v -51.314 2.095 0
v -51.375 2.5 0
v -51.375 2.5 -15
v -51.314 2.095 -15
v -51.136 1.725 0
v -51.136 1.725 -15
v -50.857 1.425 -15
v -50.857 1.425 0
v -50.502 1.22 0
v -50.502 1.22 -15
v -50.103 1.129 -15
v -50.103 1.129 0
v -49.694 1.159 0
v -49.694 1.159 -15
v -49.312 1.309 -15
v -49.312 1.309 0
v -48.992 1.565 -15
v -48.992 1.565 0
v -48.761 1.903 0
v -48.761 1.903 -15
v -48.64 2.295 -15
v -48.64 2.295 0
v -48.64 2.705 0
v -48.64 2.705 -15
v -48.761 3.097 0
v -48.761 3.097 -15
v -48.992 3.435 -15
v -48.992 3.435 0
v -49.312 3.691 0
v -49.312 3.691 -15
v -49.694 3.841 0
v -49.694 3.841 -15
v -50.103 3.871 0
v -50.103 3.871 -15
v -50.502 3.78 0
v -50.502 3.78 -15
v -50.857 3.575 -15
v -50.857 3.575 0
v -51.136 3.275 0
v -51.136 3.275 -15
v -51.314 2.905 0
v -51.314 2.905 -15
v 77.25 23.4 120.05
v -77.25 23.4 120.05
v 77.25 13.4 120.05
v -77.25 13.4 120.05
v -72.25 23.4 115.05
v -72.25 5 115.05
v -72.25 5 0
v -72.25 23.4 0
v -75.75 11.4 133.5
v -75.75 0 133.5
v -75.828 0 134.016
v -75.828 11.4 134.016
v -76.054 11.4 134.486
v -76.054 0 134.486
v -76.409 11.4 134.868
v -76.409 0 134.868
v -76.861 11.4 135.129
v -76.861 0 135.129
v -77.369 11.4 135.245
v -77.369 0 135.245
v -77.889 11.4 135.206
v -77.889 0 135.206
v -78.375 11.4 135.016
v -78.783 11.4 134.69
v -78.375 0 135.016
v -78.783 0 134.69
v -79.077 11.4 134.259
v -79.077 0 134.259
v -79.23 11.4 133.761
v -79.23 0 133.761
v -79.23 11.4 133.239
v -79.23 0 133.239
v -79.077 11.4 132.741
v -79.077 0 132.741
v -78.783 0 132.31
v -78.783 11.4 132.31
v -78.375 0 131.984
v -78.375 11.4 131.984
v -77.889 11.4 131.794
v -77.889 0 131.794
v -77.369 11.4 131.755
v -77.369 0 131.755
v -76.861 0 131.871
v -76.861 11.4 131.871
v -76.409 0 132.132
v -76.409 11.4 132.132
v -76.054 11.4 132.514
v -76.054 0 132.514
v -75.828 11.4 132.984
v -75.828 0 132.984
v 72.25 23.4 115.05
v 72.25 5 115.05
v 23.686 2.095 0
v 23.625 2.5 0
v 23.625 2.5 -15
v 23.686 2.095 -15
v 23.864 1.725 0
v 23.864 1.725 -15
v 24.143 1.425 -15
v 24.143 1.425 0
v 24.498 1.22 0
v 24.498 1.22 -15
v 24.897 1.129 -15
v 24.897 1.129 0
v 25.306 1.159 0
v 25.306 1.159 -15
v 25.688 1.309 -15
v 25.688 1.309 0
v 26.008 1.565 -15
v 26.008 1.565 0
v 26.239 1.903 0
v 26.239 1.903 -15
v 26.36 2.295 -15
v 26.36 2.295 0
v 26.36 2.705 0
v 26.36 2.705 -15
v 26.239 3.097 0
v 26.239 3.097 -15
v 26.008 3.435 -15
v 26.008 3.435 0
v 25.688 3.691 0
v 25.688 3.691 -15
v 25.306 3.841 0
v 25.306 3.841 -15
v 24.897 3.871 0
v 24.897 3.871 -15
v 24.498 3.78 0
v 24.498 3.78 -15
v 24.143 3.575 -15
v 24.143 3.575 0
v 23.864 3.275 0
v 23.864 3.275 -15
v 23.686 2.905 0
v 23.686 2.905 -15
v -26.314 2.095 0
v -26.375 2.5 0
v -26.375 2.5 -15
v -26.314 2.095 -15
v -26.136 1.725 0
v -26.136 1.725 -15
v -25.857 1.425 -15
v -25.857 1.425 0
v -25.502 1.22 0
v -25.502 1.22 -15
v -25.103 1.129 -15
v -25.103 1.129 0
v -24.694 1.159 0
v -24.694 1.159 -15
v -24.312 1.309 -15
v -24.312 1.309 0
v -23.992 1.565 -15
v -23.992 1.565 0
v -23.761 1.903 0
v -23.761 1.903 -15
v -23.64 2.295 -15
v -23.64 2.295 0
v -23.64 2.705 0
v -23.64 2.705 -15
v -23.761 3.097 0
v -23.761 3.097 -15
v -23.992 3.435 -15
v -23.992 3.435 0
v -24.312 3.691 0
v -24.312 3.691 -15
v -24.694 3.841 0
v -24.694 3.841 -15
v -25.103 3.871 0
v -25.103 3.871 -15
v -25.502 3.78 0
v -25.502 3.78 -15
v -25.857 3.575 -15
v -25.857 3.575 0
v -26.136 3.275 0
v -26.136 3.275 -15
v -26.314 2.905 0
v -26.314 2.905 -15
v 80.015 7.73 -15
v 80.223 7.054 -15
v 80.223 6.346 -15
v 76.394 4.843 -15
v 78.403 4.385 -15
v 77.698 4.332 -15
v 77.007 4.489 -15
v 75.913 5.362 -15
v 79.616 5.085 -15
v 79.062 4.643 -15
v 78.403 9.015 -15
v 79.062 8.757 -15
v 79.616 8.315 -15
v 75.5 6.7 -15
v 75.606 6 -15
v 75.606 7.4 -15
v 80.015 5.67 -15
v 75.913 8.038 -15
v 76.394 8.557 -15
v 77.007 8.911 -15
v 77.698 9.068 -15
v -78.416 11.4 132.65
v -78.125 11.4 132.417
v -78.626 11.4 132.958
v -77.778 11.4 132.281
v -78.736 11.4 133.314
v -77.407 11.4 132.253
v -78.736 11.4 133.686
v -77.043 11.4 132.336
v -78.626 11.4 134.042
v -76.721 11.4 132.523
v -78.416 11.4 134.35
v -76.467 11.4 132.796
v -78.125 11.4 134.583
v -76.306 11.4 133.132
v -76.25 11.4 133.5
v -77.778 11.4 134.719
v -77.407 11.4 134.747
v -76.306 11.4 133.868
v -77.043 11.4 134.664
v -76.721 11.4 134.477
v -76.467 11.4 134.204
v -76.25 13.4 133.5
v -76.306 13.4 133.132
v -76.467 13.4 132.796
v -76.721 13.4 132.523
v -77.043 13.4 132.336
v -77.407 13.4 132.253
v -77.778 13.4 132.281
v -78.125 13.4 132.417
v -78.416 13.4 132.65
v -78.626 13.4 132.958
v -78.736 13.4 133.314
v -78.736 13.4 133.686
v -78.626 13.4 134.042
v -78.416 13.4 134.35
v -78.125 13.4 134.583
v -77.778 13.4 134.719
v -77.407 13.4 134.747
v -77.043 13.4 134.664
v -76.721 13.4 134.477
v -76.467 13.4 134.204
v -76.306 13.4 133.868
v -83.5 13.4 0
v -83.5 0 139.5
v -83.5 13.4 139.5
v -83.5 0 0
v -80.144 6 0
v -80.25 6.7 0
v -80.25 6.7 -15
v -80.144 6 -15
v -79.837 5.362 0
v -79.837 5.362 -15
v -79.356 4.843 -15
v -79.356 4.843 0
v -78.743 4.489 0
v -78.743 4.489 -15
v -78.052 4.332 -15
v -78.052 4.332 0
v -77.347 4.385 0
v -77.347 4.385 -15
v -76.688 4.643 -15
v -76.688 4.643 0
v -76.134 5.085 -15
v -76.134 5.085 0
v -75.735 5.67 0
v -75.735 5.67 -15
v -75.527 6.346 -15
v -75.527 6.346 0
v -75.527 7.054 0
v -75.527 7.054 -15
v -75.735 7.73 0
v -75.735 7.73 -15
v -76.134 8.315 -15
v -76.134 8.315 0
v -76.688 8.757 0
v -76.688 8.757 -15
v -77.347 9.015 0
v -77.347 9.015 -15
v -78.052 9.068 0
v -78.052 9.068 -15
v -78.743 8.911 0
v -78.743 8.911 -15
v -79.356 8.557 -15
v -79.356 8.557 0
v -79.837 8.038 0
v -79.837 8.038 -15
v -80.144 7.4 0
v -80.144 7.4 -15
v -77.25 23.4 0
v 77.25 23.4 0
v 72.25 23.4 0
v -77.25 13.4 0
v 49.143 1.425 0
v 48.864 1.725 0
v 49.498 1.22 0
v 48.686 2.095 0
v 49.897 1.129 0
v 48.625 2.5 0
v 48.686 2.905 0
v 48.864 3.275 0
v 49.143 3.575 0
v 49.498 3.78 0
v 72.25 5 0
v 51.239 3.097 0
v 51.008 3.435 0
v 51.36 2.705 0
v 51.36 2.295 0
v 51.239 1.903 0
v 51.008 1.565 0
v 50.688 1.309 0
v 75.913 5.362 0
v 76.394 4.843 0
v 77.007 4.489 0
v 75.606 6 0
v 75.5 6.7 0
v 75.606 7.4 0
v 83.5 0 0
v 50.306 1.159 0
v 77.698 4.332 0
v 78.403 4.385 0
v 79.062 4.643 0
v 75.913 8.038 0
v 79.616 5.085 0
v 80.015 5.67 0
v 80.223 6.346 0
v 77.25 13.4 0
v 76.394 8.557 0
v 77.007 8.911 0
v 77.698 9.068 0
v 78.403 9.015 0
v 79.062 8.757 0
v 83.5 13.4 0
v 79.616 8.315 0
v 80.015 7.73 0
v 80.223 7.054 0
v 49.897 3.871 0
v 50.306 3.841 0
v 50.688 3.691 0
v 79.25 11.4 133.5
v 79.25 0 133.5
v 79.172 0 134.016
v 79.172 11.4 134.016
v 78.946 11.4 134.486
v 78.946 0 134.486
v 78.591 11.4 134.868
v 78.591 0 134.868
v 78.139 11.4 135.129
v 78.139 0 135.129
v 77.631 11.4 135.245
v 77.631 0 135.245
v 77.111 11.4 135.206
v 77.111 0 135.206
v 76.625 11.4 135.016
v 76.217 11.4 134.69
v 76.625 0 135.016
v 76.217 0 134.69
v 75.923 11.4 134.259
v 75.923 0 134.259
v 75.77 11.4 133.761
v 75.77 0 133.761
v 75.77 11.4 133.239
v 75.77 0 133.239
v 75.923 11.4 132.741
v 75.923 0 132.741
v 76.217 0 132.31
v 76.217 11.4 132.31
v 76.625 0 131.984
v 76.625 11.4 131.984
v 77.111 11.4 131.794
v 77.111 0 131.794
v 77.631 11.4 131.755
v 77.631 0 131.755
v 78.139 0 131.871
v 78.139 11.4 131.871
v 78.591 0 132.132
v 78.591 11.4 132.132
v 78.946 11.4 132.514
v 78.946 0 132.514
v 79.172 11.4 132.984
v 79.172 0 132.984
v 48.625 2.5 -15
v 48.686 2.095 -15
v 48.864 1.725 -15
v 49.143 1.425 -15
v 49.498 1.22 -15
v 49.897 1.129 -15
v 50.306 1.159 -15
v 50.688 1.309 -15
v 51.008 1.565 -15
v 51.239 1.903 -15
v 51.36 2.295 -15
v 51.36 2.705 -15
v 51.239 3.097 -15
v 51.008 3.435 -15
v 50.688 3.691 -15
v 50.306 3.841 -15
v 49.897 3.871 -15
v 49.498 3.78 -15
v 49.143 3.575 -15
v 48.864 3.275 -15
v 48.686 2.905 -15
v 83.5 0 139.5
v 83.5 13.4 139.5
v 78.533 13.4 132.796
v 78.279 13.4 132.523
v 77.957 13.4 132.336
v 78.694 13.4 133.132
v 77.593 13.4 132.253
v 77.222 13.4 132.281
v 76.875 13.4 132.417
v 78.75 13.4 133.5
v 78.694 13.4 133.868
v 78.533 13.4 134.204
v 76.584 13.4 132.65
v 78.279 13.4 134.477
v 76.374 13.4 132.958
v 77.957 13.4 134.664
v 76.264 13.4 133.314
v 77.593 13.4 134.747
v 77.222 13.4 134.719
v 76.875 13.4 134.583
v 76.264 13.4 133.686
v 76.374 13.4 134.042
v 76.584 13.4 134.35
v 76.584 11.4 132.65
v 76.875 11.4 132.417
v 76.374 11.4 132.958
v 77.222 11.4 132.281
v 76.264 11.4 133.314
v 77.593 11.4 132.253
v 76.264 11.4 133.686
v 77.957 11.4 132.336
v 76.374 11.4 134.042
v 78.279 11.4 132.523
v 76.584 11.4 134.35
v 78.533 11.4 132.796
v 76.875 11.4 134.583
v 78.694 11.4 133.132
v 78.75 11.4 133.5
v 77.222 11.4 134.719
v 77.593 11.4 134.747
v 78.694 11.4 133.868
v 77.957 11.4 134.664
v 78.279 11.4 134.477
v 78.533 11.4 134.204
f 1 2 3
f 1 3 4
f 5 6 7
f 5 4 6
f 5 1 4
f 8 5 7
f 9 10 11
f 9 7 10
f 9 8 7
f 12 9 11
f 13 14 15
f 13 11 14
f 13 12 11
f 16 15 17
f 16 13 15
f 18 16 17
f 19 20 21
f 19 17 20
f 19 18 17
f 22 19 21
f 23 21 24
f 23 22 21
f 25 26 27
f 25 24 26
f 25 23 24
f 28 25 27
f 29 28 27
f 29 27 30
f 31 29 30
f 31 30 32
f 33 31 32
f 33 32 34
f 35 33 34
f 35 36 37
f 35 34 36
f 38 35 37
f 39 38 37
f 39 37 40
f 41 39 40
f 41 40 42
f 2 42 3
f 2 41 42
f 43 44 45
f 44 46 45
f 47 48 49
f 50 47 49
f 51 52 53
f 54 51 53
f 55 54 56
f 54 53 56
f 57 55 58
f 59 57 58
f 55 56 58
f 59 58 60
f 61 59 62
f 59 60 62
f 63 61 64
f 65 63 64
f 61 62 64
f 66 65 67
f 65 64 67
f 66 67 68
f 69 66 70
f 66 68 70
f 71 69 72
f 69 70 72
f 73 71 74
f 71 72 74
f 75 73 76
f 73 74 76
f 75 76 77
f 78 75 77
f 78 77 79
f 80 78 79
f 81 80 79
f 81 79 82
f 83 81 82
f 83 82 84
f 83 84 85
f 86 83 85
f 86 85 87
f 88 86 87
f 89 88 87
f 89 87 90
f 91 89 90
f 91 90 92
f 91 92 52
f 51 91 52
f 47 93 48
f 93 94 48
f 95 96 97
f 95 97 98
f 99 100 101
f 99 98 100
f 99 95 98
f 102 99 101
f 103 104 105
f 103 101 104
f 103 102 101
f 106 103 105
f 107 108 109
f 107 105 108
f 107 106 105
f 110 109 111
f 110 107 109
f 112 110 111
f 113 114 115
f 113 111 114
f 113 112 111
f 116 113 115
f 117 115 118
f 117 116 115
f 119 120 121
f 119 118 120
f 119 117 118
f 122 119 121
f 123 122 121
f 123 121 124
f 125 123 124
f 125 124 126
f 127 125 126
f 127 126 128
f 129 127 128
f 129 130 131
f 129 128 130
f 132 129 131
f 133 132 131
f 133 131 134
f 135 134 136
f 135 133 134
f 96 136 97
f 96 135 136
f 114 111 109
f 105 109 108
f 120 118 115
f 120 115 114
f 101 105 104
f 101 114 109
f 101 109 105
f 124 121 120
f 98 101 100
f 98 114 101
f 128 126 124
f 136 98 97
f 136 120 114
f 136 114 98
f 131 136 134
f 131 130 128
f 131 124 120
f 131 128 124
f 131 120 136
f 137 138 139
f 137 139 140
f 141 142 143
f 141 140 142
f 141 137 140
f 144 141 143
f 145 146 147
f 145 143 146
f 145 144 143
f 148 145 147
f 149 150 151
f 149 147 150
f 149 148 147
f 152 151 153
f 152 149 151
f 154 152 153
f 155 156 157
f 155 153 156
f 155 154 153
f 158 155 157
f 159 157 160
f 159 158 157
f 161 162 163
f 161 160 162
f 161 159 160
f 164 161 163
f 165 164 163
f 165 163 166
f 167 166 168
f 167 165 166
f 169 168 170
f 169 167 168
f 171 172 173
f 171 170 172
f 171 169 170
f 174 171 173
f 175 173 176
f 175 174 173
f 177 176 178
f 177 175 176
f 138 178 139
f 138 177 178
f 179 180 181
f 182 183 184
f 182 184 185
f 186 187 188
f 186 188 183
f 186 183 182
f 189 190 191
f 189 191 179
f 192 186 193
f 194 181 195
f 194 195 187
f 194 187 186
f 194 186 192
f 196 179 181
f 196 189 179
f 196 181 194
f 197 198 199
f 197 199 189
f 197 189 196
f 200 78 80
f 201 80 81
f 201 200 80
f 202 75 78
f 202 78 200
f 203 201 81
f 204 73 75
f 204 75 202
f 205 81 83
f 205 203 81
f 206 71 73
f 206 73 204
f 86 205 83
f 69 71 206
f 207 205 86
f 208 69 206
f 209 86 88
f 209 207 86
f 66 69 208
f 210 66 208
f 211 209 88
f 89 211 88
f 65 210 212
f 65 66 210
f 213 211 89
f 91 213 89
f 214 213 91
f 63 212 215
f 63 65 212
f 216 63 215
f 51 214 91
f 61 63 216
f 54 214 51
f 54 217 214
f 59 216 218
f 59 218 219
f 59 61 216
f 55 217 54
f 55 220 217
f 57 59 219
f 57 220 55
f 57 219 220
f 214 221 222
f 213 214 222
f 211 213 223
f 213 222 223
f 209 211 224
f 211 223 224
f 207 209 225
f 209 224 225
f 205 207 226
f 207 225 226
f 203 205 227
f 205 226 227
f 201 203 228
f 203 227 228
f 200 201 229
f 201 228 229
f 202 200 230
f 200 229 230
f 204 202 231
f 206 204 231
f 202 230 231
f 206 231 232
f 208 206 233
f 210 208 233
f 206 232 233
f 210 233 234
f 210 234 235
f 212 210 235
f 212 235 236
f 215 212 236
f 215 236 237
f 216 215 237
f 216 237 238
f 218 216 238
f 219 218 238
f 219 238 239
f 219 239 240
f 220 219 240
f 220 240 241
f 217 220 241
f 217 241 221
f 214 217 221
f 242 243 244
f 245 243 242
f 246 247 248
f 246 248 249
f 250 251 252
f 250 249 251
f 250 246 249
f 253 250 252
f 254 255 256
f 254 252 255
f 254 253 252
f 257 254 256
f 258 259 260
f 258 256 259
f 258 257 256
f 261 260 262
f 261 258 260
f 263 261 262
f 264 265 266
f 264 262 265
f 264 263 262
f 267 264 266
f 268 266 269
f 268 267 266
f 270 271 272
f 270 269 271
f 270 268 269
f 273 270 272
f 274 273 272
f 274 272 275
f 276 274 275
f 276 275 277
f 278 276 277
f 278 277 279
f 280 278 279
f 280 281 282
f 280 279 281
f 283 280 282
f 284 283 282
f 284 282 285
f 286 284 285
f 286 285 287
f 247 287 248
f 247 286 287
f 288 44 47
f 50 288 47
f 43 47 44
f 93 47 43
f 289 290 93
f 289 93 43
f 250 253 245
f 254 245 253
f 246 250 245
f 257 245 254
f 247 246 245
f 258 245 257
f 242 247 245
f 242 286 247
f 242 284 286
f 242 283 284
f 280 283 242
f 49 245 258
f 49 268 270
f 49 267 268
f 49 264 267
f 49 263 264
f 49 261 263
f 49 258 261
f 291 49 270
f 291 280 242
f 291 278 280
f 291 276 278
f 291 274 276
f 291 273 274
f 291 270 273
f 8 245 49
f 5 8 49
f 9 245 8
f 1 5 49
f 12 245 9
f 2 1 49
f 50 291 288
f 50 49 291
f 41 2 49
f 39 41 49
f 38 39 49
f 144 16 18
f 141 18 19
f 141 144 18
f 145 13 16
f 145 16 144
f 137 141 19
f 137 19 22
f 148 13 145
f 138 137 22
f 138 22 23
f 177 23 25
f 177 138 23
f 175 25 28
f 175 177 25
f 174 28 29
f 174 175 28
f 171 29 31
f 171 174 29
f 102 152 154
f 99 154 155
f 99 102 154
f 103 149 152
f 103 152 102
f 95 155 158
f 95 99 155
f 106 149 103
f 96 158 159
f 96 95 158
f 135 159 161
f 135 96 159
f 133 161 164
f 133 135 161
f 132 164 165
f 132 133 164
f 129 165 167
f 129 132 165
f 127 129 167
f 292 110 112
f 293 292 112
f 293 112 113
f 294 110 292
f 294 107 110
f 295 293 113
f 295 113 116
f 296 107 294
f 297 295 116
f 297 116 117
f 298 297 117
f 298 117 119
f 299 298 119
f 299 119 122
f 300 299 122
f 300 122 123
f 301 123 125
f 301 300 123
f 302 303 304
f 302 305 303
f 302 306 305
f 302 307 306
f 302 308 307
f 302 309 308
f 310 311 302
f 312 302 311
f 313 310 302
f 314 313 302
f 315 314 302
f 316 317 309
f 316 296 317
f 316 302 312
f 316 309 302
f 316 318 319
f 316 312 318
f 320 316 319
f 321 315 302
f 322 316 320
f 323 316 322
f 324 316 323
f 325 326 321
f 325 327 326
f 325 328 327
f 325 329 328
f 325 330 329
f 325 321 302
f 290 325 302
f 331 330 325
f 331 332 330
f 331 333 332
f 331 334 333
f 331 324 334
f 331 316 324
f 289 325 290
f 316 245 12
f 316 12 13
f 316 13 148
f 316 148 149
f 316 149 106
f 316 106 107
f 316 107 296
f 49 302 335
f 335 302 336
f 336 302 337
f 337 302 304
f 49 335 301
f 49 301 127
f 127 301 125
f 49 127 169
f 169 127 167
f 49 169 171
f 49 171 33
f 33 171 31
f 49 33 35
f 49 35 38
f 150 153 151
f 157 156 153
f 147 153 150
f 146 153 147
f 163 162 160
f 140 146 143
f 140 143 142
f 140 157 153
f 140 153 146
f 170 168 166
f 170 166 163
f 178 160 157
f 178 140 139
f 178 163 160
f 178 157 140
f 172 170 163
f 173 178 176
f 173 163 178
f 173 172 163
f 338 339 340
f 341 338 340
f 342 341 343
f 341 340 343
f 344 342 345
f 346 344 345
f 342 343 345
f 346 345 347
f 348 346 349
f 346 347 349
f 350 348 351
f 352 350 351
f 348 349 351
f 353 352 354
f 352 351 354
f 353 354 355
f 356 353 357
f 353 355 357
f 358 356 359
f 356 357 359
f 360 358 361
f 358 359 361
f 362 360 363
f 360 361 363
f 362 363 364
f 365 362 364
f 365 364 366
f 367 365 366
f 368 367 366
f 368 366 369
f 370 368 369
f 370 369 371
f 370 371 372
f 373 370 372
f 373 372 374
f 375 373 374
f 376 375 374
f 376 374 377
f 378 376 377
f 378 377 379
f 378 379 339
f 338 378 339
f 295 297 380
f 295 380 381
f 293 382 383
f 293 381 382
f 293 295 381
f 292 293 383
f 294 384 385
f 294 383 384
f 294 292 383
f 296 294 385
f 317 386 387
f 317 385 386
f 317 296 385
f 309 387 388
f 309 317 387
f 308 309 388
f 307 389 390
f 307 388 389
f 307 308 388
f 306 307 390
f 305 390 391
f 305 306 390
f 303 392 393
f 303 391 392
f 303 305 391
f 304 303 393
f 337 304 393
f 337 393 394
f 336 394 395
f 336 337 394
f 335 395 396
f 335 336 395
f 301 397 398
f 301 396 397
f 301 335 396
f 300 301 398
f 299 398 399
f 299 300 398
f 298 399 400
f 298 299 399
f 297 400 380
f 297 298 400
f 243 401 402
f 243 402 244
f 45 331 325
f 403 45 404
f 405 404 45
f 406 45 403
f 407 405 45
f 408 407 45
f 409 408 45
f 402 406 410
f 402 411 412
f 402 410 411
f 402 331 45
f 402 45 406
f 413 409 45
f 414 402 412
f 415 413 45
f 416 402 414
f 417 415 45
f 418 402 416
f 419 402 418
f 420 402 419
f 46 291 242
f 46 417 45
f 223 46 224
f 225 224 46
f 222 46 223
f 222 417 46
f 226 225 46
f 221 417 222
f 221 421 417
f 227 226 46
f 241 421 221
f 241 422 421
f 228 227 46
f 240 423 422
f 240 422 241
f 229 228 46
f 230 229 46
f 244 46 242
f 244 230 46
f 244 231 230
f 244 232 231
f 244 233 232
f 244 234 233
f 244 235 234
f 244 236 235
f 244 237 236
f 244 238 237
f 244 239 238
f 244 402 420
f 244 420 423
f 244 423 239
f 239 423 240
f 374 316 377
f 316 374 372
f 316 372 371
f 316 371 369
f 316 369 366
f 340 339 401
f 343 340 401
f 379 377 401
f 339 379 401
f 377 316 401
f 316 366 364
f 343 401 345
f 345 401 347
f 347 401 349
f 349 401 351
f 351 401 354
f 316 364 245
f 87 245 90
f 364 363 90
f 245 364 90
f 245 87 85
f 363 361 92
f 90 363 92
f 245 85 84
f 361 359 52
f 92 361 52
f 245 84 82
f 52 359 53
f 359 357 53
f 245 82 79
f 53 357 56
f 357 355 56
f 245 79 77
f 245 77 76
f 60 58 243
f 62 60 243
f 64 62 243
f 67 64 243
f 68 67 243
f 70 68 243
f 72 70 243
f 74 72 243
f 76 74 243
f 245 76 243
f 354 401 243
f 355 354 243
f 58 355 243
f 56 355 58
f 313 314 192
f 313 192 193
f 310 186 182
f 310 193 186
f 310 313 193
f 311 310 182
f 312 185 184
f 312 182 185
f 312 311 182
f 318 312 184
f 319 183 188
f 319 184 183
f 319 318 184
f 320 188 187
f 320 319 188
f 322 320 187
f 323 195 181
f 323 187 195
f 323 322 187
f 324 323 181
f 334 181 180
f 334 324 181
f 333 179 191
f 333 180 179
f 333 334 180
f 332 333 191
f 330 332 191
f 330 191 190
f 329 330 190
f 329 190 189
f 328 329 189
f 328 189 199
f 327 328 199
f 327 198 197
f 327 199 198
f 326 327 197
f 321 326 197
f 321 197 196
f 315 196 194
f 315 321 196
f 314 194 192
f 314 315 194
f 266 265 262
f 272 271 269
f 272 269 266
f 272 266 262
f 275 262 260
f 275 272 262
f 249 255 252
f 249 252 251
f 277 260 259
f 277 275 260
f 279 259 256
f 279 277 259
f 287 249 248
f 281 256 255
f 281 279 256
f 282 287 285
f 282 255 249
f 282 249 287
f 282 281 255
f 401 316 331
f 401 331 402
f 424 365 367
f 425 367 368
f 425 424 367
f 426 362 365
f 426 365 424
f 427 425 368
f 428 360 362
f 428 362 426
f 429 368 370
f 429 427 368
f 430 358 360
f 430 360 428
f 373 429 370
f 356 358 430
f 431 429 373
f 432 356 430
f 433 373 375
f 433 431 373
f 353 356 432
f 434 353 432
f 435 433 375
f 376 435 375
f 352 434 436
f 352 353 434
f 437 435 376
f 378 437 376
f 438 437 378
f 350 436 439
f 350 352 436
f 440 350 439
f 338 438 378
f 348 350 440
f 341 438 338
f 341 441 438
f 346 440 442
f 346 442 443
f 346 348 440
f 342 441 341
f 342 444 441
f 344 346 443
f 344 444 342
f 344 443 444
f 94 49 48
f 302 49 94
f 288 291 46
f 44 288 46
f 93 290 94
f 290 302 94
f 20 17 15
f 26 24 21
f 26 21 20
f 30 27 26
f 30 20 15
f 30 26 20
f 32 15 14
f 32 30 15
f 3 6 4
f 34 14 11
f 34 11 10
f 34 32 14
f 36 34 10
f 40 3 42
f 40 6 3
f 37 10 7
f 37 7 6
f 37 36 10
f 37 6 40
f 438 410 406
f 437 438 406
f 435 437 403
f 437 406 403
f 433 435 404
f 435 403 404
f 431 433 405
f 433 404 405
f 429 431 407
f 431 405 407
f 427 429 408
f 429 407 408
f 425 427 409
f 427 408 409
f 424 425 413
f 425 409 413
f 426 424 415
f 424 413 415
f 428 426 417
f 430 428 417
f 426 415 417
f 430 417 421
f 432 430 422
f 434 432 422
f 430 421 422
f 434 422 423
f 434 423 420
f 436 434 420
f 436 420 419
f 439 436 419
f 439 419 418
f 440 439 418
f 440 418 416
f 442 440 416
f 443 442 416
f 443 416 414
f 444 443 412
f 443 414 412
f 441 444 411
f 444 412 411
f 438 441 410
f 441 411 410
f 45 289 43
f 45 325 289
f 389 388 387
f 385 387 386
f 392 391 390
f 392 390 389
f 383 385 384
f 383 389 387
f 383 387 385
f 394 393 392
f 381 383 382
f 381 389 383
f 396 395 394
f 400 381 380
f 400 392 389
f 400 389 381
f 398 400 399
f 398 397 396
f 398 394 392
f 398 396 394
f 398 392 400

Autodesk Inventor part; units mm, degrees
ref_plane "YZ Plane" through (0, 0, 0) normal (1, 0, 0) x (0, 1, 0)
ref_plane "XZ Plane" through (0, 0, 0) normal (0, 1, 0) x (-1, 0, 0)
sketch "Sketch1" plane through (0, 0, 0) normal (0, 1, 0) x (-1, 0, 0)
  line L0 (-83.5, 139.5) -> (83.5, 139.5)
  line L1 (83.5, 139.5) -> (83.5, -139.5)
  line L2 (83.5, -139.5) -> (-83.5, -139.5)
  line L3 (-83.5, -139.5) -> (-83.5, 139.5)
  line L4 (-83.5, 139.5) -> (83.5, -139.5) construction
  line L5 (83.5, 139.5) -> (-83.5, -139.5) construction
  point P0 (0, 0)
  dimension "d0" = 167
  dimension "d1" = 279
extrude "Extrusion1" add sketch "Sketch1" along normal blind 13.4
sketch "Sketch2" plane through (0, 13.4, 0) normal (0, 1, 0) x (1, 0, 0)
  line L0 (72.25, -115.05) -> (-72.25, -115.05)
  line L1 (-72.25, -115.05) -> (-72.25, 115.05)
  line L2 (-72.25, 115.05) -> (72.25, 115.05)
  line L3 (72.25, 115.05) -> (72.25, -115.05)
  line L4 (72.25, -115.05) -> (-72.25, 115.05) construction
  line L5 (-72.25, -115.05) -> (72.25, 115.05) construction
  point P0 (0, 0)
  dimension "d4" = 144.5
  dimension "d5" = 230.1
extrude "Extrusion2" cut sketch "Sketch2" against normal blind 8.4
sketch "Sketch4" plane through (0, 13.4, 0) normal (0, 1, 0) x (1, 0, 0)
  circle A0 centre (-77.5, -133.5) radius 1.25
  line L0 (-83.5, 139.5) -> (-83.5, -139.5) projected
  line L1 (-83.5, -139.5) -> (83.5, -139.5) projected
  circle A1 centre (-77.5, 133.5) radius 1.25
  line L2 (83.5, 139.5) -> (-83.5, 139.5) projected
  circle A2 centre (77.5, 133.5) radius 1.25
  line L3 (83.5, -139.5) -> (83.5, 139.5) projected
  circle A3 centre (77.5, -133.5) radius 1.25
  point P0 (0, 0)
  dimension "d16" = 2.5
  dimension "d17" = 6
  dimension "d18" = 6
  dimension "d19" = 2.5
  dimension "d20" = 6
  dimension "d21" = 6
  dimension "d22" = 2.5
  dimension "d23" = 6
  dimension "d24" = 6
  dimension "d25" = 2.5
  dimension "d26" = 6
  dimension "d27" = 6
extrude "Extrusion4" cut sketch "Sketch4" against normal through all contours A0 | A1 | A2 | A3
sketch "Sketch5" plane through (0, 13.4, 0) normal (0, 1, 0) x (1, 0, 0)
  line L0 (-72.25, -115.05) -> (-72.25, 115.05) projected
  line L1 (72.25, -115.05) -> (-72.25, -115.05) projected
  line L2 (-77.25, -120.05) -> (-72.25, -120.05)
  line L3 (-72.25, -120.05) -> (-72.25, 120.05)
  line L4 (-72.25, 120.05) -> (-77.25, 120.05)
  line L5 (-77.25, 120.05) -> (-77.25, -120.05)
  line L6 (72.25, 115.05) -> (72.25, -115.05) projected
  line L7 (77.25, -120.05) -> (72.25, -120.05)
  line L8 (72.25, -120.05) -> (72.25, 120.05)
  line L9 (72.25, 120.05) -> (77.25, 120.05)
  line L10 (77.25, 120.05) -> (77.25, -120.05)
  line L11 (-72.25, 115.05) -> (72.25, 115.05) projected
  line L12 (72.25, 120.05) -> (-72.25, 120.05)
  line L13 (-72.25, 120.05) -> (-72.25, 115.05)
  line L14 (-72.25, 115.05) -> (72.25, 115.05)
  line L15 (72.25, 115.05) -> (72.25, 120.05)
  line L16 (-72.25, -115.05) -> (72.25, -115.05)
  line L17 (72.25, -115.05) -> (72.25, -120.05)
  line L18 (72.25, -120.05) -> (-72.25, -120.05)
  line L19 (-72.25, -120.05) -> (-72.25, -115.05)
  point P0 (0, 0)
  dimension "d30" = 5
  dimension "d31" = 5
  dimension "d32" = 240.1
  dimension "d33" = 5
  dimension "d34" = 5
  dimension "d35" = 240.1
extrude "Extrusion5" add sketch "Sketch5" along normal blind 10 contours L3 L2 L5 L4 L0 | L1 L8 L18 L3 | L3 L12 L8 L11 | L6 L8 L9 L10 L7
sketch "Sketch7" plane through (0, 0, 0) normal (0, -1, 0) x (1, 0, 0)
  circle A0 centre (-77.5, -133.5) radius 1.25 projected
  circle A1 centre (-77.5, -133.5) radius 1.75
  circle A2 centre (-77.5, 133.5) radius 1.25 projected
  circle A3 centre (-77.5, 133.5) radius 1.75
  circle A4 centre (77.5, 133.5) radius 1.25 projected
  circle A5 centre (77.5, 133.5) radius 1.75
  circle A6 centre (77.5, -133.5) radius 1.25 projected
  circle A7 centre (77.5, -133.5) radius 1.75
  point P0 (0, 0)
  dimension "d42" = 3.5
  dimension "d43" = 3.5
  dimension "d44" = 3.5
  dimension "d45" = 3.5
extrude "Extrusion6" cut sketch "Sketch7" against normal blind 11.4 contours A0 | A1 | A2 | A3 | A4 | A5 | A7
sketch "Sketch8" plane through (83.5, 0, 139.5) normal (1, 0, 0) x (0, 0, -1)
  line L0 (139.5, 0) -> (139.5, 13.4)
  line L1 (0, 13.4) -> (279, 13.4) projected
sketch "Sketch9" plane through (0, 13.4, 0) normal (0, 1, 0) x (1, 0, 0)
  line L0 (83.5, -139.5) -> (83.5, 139.5) projected
  line L1 (83.5, 0) -> (77.25, 0)
  line L2 (77.25, 120.05) -> (77.25, -120.05) projected
  point P0 (0, 0)
sketch "Sketch10" plane through (77.25, 13.4, 120.05) normal (1, 0, 0) x (0, 0, -1)
  line L0 (-19.45, 0) -> (259.55, 0) projected
  line L1 (120.05, 0) -> (120.05, 10)
  line L2 (0, 10) -> (240.1, 10) projected
  point P0 (120.05, -13.4)
split_face "Split1"
split_face "Split2"
split_face "Split3"
ref_plane "Work Plane1" through (83.5, 0, -139.5) normal (1, 0, 0) x (0, 0, -1)
sketch "Sketch11" plane through (83.5, 0, -139.5) normal (1, 0, 0) x (0, 0, -1)
  line L0 (0, 0) -> (0, 13.4) projected
  line L1 (-139.5, 5) -> (-139.5, 23.4) projected
  line L2 (0, 0) -> (-139.5, 0)
  line L3 (-139.5, 0) -> (-139.5, 23.4)
  line L4 (-139.5, 23.4) -> (0, 23.4)
  line L5 (0, 23.4) -> (0, 0)
  point P0 (-139.5, 0)
extrude "Extrusion7" cut sketch "Sketch11" against normal blind 167.1625
sketch "Sketch12" plane through (83.5, 0, 0) normal (0, 0, -1) x (-1, 0, 0)
  line L0 (0, 0) -> (0, 13.4) projected
  circle A0 centre (5.625, 6.7) radius 2.375
  line L1 (167, 0) -> (167, 13.4) projected
  circle A1 centre (161.375, 6.7) radius 2.375
  line L2 (11.25, 5) -> (155.75, 5) projected
  circle A2 centre (58.5, 2.5) radius 1.375
  circle A3 centre (33.5, 2.5) radius 1.375
  circle A4 centre (108.5, 2.5) radius 1.375
  circle A5 centre (133.5, 2.5) radius 1.375
  point P0 (83.5, 0)
  dimension "d51" = 4.75
  dimension "d53" = 4.75
  dimension "d55" = 2.75
  dimension "d57" = 2.75
  dimension "d59" = 2.75
  dimension "d61" = 2.75
extrude "Extrusion8" add sketch "Sketch12" along normal blind 15
properties part number "Enclosure 2 Bottom" material "ABS Plastic"
